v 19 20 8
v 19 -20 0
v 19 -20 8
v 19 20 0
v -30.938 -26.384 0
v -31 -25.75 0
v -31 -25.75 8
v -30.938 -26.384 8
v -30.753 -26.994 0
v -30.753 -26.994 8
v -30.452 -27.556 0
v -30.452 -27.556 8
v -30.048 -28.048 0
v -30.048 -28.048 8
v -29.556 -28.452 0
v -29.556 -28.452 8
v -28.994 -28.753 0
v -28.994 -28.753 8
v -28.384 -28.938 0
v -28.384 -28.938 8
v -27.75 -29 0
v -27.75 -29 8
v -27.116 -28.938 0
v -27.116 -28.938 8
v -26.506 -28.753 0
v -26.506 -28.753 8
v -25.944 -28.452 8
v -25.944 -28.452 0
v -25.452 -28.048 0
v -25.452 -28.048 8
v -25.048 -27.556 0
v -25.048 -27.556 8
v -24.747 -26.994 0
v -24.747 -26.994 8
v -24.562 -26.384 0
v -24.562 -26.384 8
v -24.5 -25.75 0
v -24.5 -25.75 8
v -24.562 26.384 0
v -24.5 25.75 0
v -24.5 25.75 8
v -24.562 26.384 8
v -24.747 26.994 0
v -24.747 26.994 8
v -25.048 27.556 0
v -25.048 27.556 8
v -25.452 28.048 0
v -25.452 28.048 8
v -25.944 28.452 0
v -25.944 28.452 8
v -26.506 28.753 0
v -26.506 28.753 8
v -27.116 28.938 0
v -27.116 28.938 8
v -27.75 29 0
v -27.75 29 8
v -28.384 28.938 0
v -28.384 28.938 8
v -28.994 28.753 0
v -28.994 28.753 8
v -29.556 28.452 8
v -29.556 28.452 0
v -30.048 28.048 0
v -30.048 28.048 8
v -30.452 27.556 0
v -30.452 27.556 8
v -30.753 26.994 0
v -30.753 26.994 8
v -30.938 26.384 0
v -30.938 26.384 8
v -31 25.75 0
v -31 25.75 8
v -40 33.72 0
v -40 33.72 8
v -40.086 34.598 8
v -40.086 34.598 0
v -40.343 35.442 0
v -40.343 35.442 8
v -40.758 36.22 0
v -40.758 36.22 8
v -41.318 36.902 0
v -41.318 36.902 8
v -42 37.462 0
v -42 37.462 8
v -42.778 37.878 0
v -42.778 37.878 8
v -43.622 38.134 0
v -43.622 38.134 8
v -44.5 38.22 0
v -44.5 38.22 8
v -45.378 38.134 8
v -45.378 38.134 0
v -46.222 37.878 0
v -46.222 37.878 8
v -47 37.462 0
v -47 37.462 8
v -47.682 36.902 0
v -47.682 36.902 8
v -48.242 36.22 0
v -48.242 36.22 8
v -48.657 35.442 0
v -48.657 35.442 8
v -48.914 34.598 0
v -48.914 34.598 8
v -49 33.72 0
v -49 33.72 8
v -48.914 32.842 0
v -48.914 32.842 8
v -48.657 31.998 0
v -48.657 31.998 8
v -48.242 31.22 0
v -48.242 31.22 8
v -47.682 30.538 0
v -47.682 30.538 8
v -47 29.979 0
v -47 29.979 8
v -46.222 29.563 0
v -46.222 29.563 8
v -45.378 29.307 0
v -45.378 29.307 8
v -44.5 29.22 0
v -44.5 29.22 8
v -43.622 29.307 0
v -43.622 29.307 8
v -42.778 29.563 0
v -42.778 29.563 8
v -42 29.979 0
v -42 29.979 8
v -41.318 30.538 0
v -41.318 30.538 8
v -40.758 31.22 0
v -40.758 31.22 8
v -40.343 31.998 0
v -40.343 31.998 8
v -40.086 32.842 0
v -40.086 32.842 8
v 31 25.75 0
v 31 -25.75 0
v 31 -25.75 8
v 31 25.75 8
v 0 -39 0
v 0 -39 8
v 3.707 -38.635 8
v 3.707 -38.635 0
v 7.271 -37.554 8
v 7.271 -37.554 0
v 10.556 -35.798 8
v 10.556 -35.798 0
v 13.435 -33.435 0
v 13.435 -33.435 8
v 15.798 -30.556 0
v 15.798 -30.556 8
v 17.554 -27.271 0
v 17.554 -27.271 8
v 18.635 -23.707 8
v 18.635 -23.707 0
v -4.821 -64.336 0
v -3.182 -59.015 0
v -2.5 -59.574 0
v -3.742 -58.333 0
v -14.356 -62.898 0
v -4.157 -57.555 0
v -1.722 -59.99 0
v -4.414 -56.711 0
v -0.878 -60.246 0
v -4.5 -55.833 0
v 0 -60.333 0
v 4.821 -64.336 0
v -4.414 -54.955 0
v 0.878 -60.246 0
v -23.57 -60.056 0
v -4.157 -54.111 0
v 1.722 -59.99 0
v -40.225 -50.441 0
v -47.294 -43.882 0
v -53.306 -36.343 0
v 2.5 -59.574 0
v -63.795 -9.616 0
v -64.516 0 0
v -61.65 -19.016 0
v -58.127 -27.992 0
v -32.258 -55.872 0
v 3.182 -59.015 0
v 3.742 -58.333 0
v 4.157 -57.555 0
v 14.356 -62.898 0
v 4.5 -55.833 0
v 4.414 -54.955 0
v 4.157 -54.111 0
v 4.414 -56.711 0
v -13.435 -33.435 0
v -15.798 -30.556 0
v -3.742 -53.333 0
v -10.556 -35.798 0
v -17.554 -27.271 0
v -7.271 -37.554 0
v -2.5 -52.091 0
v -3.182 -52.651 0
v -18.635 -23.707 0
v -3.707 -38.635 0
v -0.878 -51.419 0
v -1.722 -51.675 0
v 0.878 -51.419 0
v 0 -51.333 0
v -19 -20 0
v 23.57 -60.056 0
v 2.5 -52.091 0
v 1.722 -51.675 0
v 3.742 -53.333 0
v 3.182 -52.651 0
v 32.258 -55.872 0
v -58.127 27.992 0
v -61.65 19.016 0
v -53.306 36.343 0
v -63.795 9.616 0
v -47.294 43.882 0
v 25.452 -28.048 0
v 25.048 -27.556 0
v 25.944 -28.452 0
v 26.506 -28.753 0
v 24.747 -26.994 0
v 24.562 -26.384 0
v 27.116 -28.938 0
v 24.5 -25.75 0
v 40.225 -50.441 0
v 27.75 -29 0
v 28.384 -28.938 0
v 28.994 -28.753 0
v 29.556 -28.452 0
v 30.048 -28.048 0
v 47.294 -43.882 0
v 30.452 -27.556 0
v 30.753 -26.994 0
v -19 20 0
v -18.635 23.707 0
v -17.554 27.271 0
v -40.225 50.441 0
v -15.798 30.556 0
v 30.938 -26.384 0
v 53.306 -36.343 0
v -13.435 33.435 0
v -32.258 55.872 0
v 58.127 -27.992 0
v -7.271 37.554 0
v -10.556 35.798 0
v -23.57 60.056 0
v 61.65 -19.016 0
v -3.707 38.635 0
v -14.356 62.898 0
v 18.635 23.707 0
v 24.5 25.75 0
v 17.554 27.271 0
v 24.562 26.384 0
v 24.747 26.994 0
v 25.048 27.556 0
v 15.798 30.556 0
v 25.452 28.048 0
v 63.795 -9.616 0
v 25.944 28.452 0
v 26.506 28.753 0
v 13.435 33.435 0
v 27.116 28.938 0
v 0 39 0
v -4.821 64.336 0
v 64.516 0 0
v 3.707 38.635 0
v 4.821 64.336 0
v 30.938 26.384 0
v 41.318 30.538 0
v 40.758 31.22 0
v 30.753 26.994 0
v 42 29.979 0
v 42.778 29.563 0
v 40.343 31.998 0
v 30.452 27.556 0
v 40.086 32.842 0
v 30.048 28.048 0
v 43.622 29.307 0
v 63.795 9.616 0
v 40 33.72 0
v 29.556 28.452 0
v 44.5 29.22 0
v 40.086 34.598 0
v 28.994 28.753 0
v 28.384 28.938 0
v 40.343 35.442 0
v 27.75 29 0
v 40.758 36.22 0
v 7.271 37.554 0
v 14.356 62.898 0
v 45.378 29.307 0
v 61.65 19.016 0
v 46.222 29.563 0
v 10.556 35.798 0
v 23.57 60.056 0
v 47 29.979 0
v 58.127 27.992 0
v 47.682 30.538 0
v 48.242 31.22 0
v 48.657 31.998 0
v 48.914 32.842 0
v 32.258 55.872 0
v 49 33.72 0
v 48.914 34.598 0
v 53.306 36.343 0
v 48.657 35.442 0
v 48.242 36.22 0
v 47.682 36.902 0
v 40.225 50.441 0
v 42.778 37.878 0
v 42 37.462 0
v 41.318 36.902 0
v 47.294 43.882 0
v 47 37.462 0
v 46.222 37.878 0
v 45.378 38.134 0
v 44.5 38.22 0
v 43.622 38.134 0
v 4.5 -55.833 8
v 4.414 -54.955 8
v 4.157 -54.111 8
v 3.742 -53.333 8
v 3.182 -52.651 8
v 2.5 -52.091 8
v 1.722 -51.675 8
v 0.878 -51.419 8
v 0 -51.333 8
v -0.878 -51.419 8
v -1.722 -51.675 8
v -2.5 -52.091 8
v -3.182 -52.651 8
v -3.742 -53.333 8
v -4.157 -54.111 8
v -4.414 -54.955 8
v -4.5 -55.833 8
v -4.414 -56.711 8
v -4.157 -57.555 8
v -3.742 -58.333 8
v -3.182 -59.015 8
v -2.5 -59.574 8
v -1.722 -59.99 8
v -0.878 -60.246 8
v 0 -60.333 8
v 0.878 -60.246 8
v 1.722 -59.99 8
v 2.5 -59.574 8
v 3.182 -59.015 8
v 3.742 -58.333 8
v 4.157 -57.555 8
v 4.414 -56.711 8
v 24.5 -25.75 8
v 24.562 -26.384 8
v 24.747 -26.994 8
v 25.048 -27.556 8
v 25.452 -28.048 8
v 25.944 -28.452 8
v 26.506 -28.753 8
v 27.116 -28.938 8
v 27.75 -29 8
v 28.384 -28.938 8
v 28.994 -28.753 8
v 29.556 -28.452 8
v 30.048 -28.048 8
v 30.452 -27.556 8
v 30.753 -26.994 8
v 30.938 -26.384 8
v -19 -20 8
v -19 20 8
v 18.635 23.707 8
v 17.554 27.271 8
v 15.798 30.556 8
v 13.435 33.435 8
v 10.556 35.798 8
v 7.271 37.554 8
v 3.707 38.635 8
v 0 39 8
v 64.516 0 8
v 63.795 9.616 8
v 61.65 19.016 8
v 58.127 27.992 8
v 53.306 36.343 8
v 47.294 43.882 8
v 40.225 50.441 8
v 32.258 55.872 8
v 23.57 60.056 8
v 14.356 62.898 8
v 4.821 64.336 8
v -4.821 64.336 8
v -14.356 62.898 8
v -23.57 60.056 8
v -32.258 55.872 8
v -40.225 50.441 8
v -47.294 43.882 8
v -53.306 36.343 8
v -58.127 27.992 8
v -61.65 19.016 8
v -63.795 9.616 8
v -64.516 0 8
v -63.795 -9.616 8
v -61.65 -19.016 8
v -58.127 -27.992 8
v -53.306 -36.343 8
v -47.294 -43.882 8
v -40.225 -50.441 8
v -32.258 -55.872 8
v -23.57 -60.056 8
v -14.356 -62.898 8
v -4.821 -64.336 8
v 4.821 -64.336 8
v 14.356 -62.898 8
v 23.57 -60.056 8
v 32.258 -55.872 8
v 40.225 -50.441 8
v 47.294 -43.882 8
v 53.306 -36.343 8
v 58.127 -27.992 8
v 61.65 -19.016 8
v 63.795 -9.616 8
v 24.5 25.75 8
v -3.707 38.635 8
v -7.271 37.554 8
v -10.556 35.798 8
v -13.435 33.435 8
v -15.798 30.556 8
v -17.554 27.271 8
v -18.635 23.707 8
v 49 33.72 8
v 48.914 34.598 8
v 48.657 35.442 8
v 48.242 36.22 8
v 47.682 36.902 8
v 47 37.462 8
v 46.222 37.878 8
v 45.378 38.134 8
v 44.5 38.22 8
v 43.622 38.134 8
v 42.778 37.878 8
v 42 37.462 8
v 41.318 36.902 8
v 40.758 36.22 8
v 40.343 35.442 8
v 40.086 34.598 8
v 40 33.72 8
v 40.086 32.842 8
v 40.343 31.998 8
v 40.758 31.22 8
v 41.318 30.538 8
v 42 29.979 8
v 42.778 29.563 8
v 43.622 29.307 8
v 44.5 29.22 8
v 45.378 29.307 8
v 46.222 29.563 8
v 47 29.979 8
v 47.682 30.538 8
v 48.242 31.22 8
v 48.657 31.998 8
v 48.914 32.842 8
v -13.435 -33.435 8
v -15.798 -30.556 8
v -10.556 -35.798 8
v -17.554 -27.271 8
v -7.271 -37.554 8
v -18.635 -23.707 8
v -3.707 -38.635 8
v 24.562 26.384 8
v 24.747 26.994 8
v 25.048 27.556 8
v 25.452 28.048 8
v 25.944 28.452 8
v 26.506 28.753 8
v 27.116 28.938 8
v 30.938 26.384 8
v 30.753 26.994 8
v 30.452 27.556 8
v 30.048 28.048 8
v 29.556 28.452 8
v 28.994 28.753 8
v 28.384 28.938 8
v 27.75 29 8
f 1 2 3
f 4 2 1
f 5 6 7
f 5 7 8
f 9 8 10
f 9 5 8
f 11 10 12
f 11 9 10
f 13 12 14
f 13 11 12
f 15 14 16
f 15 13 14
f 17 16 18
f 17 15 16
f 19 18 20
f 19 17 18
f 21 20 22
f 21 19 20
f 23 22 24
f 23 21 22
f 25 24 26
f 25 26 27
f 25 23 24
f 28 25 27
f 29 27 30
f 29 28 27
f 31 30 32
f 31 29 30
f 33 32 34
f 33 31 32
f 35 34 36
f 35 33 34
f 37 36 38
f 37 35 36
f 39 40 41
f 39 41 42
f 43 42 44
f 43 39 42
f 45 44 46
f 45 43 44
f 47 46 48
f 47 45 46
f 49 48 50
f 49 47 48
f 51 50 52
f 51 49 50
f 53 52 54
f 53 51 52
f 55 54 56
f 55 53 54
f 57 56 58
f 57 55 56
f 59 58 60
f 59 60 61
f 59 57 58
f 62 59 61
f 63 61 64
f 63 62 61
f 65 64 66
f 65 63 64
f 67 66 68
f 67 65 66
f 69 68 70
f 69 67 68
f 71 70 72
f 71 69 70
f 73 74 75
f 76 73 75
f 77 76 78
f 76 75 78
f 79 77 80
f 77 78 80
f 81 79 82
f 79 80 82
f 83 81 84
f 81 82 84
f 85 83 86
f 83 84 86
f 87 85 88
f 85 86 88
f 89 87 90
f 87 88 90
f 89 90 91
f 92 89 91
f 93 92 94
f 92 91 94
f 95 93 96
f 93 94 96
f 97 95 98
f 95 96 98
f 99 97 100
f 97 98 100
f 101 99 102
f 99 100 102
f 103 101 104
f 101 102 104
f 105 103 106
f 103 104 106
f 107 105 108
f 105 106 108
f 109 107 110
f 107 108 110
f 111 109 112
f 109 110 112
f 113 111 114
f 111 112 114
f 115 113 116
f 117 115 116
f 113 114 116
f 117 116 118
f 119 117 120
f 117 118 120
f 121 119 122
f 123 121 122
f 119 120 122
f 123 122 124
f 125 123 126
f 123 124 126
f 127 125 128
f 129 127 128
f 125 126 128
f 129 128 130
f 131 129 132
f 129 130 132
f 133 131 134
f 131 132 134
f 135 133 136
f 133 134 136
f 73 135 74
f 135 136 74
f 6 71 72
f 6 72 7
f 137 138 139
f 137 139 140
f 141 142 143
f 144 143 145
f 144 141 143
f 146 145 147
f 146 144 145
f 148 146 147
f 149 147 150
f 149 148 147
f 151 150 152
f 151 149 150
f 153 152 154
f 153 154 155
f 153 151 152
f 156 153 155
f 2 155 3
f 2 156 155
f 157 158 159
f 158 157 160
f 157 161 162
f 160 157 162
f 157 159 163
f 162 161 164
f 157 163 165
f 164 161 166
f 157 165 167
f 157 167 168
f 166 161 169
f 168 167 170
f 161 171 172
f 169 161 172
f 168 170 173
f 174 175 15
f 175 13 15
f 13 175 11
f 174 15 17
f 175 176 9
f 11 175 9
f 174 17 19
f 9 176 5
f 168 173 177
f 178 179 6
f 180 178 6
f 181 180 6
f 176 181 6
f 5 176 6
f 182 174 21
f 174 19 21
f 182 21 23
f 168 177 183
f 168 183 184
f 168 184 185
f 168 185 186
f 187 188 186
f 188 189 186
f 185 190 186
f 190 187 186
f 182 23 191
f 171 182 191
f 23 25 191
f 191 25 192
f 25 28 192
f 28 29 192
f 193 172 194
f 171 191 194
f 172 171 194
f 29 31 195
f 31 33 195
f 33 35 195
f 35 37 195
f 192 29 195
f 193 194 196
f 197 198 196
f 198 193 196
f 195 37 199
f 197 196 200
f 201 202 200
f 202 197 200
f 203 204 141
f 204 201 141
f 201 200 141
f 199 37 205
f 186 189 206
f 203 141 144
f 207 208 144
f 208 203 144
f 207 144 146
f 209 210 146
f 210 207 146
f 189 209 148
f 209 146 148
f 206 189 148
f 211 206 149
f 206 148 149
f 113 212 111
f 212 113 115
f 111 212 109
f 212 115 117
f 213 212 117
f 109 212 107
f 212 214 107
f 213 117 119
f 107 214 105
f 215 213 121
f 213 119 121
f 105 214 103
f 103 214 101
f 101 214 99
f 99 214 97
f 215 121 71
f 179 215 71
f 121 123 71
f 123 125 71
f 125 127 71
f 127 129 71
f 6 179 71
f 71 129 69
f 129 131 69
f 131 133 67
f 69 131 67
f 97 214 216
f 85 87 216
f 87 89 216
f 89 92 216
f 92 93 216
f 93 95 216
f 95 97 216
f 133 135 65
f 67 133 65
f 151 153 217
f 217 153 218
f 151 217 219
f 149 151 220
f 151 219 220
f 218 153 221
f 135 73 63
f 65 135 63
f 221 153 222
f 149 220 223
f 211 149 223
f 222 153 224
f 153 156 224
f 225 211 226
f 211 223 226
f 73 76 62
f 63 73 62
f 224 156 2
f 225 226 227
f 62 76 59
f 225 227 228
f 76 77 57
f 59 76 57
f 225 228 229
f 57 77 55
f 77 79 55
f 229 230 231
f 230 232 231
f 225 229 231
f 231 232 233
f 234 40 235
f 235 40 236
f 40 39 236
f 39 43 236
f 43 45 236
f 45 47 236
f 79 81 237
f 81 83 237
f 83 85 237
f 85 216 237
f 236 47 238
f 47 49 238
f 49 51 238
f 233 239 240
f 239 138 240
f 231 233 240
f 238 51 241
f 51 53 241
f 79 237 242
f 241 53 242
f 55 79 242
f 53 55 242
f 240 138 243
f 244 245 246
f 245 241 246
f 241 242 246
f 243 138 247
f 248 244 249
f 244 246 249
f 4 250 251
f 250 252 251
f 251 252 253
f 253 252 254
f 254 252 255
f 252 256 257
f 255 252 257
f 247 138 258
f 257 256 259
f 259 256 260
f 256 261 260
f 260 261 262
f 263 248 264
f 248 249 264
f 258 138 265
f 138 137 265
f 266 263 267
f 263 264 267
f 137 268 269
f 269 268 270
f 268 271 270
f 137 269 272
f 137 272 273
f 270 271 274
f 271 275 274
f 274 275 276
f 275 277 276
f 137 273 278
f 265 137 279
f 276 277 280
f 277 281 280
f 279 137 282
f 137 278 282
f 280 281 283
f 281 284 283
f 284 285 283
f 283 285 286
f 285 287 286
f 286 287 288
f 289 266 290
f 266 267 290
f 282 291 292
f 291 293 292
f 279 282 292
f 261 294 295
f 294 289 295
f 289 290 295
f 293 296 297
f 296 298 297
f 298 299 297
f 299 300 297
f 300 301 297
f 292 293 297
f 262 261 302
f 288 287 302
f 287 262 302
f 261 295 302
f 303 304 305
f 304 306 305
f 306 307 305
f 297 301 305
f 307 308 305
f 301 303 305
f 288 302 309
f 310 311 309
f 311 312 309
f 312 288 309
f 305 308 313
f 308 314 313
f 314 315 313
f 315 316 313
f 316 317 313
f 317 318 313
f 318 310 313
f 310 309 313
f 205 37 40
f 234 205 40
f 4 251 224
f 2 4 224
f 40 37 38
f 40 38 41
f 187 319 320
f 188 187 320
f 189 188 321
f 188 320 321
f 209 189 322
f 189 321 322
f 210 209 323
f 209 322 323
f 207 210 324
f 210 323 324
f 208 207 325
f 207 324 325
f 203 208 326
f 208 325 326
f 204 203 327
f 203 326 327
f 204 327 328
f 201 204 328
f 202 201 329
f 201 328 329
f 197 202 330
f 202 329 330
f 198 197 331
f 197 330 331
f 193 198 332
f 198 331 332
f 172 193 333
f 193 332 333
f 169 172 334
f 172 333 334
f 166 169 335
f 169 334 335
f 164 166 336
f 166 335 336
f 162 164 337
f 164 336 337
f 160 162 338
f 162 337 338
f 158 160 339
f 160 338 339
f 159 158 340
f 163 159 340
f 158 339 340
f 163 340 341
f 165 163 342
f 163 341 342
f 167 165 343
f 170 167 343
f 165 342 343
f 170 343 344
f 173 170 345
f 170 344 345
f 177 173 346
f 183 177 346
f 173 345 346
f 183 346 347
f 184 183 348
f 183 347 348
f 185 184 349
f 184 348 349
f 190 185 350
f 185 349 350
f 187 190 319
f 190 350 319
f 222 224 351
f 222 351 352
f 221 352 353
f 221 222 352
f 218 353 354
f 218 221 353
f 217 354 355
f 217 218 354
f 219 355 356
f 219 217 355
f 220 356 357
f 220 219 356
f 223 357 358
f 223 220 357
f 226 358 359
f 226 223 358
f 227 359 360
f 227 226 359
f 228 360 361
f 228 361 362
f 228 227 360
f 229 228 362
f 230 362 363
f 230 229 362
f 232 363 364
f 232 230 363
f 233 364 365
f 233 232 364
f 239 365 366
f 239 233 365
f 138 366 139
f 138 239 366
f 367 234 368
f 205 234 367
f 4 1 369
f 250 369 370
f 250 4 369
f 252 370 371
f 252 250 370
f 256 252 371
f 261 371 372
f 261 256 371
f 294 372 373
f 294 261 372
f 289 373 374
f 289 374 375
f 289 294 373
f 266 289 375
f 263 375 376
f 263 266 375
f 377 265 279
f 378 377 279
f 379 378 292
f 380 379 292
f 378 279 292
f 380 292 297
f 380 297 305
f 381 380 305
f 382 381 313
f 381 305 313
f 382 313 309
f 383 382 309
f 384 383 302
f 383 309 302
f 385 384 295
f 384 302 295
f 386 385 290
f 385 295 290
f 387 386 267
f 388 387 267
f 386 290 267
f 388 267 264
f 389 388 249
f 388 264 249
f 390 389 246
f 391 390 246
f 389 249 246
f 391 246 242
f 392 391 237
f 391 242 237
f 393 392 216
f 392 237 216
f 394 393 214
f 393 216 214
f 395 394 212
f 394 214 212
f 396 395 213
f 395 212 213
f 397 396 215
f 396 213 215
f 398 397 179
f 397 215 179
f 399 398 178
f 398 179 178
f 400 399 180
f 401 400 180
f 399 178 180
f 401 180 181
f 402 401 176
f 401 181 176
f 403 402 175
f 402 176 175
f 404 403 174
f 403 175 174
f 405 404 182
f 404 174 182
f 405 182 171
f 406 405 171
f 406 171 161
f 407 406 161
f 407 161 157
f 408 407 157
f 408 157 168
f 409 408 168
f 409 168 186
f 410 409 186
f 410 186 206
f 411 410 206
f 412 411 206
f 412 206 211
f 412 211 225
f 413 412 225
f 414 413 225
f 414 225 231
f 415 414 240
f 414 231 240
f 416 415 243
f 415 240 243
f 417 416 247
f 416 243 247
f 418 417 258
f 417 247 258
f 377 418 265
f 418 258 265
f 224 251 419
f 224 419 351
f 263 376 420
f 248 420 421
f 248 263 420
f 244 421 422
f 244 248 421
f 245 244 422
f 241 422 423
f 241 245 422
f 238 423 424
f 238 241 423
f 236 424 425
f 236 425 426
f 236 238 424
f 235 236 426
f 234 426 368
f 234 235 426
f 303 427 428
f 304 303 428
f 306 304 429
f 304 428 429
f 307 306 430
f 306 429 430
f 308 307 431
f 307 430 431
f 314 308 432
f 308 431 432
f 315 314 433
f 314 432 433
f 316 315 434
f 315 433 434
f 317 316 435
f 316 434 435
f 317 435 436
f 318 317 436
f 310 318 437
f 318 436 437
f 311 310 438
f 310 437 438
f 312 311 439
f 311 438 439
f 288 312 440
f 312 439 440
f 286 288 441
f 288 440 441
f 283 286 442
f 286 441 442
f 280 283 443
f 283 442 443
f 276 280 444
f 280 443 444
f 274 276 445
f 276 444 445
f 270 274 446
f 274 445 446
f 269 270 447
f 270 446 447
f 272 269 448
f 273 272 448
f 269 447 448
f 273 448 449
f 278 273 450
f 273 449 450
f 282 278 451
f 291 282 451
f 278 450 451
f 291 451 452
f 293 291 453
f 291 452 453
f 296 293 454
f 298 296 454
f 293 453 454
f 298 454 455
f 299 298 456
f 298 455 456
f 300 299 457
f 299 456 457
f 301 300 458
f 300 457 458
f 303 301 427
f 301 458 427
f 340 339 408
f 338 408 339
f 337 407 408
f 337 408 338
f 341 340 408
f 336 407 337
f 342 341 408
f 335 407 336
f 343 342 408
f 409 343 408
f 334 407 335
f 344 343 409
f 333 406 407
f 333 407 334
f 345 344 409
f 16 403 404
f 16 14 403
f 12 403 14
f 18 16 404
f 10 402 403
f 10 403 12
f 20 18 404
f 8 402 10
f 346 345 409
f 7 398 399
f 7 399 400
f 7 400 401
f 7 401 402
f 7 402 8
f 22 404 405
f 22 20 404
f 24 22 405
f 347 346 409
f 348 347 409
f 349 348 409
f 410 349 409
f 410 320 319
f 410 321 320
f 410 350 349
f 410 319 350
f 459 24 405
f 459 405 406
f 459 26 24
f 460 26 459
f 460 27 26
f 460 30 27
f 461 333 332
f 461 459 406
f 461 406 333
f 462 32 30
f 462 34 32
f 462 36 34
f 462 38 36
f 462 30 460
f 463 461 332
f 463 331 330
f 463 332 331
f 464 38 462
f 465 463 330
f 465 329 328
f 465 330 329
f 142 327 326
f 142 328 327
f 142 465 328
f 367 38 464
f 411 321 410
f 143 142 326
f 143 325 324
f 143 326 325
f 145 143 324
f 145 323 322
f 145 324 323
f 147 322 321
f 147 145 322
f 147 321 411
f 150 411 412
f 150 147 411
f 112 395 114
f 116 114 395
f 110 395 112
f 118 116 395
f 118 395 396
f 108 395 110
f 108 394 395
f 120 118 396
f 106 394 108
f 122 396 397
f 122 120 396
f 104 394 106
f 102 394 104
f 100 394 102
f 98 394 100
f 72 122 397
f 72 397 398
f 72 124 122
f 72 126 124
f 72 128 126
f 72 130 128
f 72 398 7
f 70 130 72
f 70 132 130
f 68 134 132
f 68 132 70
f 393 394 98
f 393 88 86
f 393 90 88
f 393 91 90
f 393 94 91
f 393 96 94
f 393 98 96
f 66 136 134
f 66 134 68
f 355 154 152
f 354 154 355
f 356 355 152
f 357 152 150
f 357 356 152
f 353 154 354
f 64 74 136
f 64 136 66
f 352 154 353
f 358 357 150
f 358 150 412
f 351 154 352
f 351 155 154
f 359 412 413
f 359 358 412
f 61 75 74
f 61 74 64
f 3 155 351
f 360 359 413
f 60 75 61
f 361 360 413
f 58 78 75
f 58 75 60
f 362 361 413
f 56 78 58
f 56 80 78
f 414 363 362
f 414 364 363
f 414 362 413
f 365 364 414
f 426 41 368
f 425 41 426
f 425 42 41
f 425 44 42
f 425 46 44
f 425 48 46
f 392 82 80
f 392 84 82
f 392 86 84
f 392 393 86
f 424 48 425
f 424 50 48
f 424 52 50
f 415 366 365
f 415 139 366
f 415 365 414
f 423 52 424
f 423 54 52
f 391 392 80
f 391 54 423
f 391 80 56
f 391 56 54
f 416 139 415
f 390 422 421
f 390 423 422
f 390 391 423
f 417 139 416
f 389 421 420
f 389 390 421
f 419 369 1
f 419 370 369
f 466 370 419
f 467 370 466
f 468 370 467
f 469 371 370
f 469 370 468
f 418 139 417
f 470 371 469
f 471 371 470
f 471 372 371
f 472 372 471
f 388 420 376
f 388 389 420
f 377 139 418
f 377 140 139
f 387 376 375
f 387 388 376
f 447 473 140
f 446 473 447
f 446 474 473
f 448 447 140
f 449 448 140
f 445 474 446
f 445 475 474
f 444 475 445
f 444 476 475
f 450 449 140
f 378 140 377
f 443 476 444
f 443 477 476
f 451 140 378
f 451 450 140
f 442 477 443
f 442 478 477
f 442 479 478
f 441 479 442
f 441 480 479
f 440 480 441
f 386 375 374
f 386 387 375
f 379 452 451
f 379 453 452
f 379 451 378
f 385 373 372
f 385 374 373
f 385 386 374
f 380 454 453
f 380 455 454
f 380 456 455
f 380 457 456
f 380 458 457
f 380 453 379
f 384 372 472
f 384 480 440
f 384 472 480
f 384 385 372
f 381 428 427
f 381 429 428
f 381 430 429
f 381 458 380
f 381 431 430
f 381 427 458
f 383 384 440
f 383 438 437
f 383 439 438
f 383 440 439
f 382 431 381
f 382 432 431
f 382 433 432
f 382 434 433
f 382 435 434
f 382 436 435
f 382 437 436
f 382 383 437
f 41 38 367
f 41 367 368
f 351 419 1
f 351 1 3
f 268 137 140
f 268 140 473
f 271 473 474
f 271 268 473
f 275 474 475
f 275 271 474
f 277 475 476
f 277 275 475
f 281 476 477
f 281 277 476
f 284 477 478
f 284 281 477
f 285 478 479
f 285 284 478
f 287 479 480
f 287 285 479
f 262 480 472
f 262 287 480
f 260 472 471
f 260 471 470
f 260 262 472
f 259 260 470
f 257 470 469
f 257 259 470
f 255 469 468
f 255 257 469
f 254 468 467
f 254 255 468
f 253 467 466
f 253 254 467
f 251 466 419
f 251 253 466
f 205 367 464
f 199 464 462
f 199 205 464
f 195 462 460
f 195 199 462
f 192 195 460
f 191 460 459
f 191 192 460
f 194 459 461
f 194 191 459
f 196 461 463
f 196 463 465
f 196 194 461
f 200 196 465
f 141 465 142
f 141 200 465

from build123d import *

# Parameters (mm, degrees)
F0_R     = 64.516
F2_DEPTH = 8
F3_DEPTH = 8
F4_R     = 4.5
F5_DEPTH = 8


with BuildPart() as f2:
    # F0 (on Top) → F2 (new body)
    with BuildSketch(Plane.XY):
        Circle(F0_R)
    extrude(amount=F2_DEPTH)

    # F1 (on Top) → F3 (cut, through all)
    with BuildSketch(Plane.XY):
        with BuildLine():
            Line((-19, 20), (-19, 0))
            Line((-19, 0), (-19, -20))
            ThreePointArc((-19, -20), (-13.435029, -33.435029), (0, -39))
            ThreePointArc((0, -39), (13.435029, -33.435029), (19, -20))
            Line((19, -20), (19, 0))
            Line((19, 0), (19, 20))
            ThreePointArc((19, 20), (13.435029, 33.435029), (0, 39))
            ThreePointArc((0, 39), (-13.435029, 33.435029), (-19, 20))
        make_face()
        with BuildLine():
            Line((-24.5, -25.75), (-24.5, 0))
            Line((-24.5, 0), (-24.5, 25.75))
            ThreePointArc((-24.5, 25.75), (-27.75, 29), (-31, 25.75))
            Line((-31, 25.75), (-31, 0))
            Line((-31, 0), (-31, -25.75))
            ThreePointArc((-31, -25.75), (-27.75, -29), (-24.5, -25.75))
        make_face()
        with BuildLine():
            Line((24.5, 25.75), (24.5, 0))
            Line((24.5, 0), (24.5, -25.75))
            ThreePointArc((24.5, -25.75), (27.75, -29), (31, -25.75))
            Line((31, -25.75), (31, 0))
            Line((31, 0), (31, 25.75))
            ThreePointArc((31, 25.75), (27.75, 29), (24.5, 25.75))
        make_face()
    extrude(amount=F3_DEPTH, mode=Mode.SUBTRACT)

    # F4 (on face) → F5 (cut, through all)
    with BuildSketch(Plane.XY.offset(8)):
        with Locations((0, -55.832823)):
            Circle(F4_R)
        with Locations((-44.5, 33.720234)):
            Circle(F4_R)
        with Locations((44.5, 33.720234)):
            Circle(F4_R)
    extrude(amount=-F5_DEPTH, mode=Mode.SUBTRACT)


solid = f2.part
